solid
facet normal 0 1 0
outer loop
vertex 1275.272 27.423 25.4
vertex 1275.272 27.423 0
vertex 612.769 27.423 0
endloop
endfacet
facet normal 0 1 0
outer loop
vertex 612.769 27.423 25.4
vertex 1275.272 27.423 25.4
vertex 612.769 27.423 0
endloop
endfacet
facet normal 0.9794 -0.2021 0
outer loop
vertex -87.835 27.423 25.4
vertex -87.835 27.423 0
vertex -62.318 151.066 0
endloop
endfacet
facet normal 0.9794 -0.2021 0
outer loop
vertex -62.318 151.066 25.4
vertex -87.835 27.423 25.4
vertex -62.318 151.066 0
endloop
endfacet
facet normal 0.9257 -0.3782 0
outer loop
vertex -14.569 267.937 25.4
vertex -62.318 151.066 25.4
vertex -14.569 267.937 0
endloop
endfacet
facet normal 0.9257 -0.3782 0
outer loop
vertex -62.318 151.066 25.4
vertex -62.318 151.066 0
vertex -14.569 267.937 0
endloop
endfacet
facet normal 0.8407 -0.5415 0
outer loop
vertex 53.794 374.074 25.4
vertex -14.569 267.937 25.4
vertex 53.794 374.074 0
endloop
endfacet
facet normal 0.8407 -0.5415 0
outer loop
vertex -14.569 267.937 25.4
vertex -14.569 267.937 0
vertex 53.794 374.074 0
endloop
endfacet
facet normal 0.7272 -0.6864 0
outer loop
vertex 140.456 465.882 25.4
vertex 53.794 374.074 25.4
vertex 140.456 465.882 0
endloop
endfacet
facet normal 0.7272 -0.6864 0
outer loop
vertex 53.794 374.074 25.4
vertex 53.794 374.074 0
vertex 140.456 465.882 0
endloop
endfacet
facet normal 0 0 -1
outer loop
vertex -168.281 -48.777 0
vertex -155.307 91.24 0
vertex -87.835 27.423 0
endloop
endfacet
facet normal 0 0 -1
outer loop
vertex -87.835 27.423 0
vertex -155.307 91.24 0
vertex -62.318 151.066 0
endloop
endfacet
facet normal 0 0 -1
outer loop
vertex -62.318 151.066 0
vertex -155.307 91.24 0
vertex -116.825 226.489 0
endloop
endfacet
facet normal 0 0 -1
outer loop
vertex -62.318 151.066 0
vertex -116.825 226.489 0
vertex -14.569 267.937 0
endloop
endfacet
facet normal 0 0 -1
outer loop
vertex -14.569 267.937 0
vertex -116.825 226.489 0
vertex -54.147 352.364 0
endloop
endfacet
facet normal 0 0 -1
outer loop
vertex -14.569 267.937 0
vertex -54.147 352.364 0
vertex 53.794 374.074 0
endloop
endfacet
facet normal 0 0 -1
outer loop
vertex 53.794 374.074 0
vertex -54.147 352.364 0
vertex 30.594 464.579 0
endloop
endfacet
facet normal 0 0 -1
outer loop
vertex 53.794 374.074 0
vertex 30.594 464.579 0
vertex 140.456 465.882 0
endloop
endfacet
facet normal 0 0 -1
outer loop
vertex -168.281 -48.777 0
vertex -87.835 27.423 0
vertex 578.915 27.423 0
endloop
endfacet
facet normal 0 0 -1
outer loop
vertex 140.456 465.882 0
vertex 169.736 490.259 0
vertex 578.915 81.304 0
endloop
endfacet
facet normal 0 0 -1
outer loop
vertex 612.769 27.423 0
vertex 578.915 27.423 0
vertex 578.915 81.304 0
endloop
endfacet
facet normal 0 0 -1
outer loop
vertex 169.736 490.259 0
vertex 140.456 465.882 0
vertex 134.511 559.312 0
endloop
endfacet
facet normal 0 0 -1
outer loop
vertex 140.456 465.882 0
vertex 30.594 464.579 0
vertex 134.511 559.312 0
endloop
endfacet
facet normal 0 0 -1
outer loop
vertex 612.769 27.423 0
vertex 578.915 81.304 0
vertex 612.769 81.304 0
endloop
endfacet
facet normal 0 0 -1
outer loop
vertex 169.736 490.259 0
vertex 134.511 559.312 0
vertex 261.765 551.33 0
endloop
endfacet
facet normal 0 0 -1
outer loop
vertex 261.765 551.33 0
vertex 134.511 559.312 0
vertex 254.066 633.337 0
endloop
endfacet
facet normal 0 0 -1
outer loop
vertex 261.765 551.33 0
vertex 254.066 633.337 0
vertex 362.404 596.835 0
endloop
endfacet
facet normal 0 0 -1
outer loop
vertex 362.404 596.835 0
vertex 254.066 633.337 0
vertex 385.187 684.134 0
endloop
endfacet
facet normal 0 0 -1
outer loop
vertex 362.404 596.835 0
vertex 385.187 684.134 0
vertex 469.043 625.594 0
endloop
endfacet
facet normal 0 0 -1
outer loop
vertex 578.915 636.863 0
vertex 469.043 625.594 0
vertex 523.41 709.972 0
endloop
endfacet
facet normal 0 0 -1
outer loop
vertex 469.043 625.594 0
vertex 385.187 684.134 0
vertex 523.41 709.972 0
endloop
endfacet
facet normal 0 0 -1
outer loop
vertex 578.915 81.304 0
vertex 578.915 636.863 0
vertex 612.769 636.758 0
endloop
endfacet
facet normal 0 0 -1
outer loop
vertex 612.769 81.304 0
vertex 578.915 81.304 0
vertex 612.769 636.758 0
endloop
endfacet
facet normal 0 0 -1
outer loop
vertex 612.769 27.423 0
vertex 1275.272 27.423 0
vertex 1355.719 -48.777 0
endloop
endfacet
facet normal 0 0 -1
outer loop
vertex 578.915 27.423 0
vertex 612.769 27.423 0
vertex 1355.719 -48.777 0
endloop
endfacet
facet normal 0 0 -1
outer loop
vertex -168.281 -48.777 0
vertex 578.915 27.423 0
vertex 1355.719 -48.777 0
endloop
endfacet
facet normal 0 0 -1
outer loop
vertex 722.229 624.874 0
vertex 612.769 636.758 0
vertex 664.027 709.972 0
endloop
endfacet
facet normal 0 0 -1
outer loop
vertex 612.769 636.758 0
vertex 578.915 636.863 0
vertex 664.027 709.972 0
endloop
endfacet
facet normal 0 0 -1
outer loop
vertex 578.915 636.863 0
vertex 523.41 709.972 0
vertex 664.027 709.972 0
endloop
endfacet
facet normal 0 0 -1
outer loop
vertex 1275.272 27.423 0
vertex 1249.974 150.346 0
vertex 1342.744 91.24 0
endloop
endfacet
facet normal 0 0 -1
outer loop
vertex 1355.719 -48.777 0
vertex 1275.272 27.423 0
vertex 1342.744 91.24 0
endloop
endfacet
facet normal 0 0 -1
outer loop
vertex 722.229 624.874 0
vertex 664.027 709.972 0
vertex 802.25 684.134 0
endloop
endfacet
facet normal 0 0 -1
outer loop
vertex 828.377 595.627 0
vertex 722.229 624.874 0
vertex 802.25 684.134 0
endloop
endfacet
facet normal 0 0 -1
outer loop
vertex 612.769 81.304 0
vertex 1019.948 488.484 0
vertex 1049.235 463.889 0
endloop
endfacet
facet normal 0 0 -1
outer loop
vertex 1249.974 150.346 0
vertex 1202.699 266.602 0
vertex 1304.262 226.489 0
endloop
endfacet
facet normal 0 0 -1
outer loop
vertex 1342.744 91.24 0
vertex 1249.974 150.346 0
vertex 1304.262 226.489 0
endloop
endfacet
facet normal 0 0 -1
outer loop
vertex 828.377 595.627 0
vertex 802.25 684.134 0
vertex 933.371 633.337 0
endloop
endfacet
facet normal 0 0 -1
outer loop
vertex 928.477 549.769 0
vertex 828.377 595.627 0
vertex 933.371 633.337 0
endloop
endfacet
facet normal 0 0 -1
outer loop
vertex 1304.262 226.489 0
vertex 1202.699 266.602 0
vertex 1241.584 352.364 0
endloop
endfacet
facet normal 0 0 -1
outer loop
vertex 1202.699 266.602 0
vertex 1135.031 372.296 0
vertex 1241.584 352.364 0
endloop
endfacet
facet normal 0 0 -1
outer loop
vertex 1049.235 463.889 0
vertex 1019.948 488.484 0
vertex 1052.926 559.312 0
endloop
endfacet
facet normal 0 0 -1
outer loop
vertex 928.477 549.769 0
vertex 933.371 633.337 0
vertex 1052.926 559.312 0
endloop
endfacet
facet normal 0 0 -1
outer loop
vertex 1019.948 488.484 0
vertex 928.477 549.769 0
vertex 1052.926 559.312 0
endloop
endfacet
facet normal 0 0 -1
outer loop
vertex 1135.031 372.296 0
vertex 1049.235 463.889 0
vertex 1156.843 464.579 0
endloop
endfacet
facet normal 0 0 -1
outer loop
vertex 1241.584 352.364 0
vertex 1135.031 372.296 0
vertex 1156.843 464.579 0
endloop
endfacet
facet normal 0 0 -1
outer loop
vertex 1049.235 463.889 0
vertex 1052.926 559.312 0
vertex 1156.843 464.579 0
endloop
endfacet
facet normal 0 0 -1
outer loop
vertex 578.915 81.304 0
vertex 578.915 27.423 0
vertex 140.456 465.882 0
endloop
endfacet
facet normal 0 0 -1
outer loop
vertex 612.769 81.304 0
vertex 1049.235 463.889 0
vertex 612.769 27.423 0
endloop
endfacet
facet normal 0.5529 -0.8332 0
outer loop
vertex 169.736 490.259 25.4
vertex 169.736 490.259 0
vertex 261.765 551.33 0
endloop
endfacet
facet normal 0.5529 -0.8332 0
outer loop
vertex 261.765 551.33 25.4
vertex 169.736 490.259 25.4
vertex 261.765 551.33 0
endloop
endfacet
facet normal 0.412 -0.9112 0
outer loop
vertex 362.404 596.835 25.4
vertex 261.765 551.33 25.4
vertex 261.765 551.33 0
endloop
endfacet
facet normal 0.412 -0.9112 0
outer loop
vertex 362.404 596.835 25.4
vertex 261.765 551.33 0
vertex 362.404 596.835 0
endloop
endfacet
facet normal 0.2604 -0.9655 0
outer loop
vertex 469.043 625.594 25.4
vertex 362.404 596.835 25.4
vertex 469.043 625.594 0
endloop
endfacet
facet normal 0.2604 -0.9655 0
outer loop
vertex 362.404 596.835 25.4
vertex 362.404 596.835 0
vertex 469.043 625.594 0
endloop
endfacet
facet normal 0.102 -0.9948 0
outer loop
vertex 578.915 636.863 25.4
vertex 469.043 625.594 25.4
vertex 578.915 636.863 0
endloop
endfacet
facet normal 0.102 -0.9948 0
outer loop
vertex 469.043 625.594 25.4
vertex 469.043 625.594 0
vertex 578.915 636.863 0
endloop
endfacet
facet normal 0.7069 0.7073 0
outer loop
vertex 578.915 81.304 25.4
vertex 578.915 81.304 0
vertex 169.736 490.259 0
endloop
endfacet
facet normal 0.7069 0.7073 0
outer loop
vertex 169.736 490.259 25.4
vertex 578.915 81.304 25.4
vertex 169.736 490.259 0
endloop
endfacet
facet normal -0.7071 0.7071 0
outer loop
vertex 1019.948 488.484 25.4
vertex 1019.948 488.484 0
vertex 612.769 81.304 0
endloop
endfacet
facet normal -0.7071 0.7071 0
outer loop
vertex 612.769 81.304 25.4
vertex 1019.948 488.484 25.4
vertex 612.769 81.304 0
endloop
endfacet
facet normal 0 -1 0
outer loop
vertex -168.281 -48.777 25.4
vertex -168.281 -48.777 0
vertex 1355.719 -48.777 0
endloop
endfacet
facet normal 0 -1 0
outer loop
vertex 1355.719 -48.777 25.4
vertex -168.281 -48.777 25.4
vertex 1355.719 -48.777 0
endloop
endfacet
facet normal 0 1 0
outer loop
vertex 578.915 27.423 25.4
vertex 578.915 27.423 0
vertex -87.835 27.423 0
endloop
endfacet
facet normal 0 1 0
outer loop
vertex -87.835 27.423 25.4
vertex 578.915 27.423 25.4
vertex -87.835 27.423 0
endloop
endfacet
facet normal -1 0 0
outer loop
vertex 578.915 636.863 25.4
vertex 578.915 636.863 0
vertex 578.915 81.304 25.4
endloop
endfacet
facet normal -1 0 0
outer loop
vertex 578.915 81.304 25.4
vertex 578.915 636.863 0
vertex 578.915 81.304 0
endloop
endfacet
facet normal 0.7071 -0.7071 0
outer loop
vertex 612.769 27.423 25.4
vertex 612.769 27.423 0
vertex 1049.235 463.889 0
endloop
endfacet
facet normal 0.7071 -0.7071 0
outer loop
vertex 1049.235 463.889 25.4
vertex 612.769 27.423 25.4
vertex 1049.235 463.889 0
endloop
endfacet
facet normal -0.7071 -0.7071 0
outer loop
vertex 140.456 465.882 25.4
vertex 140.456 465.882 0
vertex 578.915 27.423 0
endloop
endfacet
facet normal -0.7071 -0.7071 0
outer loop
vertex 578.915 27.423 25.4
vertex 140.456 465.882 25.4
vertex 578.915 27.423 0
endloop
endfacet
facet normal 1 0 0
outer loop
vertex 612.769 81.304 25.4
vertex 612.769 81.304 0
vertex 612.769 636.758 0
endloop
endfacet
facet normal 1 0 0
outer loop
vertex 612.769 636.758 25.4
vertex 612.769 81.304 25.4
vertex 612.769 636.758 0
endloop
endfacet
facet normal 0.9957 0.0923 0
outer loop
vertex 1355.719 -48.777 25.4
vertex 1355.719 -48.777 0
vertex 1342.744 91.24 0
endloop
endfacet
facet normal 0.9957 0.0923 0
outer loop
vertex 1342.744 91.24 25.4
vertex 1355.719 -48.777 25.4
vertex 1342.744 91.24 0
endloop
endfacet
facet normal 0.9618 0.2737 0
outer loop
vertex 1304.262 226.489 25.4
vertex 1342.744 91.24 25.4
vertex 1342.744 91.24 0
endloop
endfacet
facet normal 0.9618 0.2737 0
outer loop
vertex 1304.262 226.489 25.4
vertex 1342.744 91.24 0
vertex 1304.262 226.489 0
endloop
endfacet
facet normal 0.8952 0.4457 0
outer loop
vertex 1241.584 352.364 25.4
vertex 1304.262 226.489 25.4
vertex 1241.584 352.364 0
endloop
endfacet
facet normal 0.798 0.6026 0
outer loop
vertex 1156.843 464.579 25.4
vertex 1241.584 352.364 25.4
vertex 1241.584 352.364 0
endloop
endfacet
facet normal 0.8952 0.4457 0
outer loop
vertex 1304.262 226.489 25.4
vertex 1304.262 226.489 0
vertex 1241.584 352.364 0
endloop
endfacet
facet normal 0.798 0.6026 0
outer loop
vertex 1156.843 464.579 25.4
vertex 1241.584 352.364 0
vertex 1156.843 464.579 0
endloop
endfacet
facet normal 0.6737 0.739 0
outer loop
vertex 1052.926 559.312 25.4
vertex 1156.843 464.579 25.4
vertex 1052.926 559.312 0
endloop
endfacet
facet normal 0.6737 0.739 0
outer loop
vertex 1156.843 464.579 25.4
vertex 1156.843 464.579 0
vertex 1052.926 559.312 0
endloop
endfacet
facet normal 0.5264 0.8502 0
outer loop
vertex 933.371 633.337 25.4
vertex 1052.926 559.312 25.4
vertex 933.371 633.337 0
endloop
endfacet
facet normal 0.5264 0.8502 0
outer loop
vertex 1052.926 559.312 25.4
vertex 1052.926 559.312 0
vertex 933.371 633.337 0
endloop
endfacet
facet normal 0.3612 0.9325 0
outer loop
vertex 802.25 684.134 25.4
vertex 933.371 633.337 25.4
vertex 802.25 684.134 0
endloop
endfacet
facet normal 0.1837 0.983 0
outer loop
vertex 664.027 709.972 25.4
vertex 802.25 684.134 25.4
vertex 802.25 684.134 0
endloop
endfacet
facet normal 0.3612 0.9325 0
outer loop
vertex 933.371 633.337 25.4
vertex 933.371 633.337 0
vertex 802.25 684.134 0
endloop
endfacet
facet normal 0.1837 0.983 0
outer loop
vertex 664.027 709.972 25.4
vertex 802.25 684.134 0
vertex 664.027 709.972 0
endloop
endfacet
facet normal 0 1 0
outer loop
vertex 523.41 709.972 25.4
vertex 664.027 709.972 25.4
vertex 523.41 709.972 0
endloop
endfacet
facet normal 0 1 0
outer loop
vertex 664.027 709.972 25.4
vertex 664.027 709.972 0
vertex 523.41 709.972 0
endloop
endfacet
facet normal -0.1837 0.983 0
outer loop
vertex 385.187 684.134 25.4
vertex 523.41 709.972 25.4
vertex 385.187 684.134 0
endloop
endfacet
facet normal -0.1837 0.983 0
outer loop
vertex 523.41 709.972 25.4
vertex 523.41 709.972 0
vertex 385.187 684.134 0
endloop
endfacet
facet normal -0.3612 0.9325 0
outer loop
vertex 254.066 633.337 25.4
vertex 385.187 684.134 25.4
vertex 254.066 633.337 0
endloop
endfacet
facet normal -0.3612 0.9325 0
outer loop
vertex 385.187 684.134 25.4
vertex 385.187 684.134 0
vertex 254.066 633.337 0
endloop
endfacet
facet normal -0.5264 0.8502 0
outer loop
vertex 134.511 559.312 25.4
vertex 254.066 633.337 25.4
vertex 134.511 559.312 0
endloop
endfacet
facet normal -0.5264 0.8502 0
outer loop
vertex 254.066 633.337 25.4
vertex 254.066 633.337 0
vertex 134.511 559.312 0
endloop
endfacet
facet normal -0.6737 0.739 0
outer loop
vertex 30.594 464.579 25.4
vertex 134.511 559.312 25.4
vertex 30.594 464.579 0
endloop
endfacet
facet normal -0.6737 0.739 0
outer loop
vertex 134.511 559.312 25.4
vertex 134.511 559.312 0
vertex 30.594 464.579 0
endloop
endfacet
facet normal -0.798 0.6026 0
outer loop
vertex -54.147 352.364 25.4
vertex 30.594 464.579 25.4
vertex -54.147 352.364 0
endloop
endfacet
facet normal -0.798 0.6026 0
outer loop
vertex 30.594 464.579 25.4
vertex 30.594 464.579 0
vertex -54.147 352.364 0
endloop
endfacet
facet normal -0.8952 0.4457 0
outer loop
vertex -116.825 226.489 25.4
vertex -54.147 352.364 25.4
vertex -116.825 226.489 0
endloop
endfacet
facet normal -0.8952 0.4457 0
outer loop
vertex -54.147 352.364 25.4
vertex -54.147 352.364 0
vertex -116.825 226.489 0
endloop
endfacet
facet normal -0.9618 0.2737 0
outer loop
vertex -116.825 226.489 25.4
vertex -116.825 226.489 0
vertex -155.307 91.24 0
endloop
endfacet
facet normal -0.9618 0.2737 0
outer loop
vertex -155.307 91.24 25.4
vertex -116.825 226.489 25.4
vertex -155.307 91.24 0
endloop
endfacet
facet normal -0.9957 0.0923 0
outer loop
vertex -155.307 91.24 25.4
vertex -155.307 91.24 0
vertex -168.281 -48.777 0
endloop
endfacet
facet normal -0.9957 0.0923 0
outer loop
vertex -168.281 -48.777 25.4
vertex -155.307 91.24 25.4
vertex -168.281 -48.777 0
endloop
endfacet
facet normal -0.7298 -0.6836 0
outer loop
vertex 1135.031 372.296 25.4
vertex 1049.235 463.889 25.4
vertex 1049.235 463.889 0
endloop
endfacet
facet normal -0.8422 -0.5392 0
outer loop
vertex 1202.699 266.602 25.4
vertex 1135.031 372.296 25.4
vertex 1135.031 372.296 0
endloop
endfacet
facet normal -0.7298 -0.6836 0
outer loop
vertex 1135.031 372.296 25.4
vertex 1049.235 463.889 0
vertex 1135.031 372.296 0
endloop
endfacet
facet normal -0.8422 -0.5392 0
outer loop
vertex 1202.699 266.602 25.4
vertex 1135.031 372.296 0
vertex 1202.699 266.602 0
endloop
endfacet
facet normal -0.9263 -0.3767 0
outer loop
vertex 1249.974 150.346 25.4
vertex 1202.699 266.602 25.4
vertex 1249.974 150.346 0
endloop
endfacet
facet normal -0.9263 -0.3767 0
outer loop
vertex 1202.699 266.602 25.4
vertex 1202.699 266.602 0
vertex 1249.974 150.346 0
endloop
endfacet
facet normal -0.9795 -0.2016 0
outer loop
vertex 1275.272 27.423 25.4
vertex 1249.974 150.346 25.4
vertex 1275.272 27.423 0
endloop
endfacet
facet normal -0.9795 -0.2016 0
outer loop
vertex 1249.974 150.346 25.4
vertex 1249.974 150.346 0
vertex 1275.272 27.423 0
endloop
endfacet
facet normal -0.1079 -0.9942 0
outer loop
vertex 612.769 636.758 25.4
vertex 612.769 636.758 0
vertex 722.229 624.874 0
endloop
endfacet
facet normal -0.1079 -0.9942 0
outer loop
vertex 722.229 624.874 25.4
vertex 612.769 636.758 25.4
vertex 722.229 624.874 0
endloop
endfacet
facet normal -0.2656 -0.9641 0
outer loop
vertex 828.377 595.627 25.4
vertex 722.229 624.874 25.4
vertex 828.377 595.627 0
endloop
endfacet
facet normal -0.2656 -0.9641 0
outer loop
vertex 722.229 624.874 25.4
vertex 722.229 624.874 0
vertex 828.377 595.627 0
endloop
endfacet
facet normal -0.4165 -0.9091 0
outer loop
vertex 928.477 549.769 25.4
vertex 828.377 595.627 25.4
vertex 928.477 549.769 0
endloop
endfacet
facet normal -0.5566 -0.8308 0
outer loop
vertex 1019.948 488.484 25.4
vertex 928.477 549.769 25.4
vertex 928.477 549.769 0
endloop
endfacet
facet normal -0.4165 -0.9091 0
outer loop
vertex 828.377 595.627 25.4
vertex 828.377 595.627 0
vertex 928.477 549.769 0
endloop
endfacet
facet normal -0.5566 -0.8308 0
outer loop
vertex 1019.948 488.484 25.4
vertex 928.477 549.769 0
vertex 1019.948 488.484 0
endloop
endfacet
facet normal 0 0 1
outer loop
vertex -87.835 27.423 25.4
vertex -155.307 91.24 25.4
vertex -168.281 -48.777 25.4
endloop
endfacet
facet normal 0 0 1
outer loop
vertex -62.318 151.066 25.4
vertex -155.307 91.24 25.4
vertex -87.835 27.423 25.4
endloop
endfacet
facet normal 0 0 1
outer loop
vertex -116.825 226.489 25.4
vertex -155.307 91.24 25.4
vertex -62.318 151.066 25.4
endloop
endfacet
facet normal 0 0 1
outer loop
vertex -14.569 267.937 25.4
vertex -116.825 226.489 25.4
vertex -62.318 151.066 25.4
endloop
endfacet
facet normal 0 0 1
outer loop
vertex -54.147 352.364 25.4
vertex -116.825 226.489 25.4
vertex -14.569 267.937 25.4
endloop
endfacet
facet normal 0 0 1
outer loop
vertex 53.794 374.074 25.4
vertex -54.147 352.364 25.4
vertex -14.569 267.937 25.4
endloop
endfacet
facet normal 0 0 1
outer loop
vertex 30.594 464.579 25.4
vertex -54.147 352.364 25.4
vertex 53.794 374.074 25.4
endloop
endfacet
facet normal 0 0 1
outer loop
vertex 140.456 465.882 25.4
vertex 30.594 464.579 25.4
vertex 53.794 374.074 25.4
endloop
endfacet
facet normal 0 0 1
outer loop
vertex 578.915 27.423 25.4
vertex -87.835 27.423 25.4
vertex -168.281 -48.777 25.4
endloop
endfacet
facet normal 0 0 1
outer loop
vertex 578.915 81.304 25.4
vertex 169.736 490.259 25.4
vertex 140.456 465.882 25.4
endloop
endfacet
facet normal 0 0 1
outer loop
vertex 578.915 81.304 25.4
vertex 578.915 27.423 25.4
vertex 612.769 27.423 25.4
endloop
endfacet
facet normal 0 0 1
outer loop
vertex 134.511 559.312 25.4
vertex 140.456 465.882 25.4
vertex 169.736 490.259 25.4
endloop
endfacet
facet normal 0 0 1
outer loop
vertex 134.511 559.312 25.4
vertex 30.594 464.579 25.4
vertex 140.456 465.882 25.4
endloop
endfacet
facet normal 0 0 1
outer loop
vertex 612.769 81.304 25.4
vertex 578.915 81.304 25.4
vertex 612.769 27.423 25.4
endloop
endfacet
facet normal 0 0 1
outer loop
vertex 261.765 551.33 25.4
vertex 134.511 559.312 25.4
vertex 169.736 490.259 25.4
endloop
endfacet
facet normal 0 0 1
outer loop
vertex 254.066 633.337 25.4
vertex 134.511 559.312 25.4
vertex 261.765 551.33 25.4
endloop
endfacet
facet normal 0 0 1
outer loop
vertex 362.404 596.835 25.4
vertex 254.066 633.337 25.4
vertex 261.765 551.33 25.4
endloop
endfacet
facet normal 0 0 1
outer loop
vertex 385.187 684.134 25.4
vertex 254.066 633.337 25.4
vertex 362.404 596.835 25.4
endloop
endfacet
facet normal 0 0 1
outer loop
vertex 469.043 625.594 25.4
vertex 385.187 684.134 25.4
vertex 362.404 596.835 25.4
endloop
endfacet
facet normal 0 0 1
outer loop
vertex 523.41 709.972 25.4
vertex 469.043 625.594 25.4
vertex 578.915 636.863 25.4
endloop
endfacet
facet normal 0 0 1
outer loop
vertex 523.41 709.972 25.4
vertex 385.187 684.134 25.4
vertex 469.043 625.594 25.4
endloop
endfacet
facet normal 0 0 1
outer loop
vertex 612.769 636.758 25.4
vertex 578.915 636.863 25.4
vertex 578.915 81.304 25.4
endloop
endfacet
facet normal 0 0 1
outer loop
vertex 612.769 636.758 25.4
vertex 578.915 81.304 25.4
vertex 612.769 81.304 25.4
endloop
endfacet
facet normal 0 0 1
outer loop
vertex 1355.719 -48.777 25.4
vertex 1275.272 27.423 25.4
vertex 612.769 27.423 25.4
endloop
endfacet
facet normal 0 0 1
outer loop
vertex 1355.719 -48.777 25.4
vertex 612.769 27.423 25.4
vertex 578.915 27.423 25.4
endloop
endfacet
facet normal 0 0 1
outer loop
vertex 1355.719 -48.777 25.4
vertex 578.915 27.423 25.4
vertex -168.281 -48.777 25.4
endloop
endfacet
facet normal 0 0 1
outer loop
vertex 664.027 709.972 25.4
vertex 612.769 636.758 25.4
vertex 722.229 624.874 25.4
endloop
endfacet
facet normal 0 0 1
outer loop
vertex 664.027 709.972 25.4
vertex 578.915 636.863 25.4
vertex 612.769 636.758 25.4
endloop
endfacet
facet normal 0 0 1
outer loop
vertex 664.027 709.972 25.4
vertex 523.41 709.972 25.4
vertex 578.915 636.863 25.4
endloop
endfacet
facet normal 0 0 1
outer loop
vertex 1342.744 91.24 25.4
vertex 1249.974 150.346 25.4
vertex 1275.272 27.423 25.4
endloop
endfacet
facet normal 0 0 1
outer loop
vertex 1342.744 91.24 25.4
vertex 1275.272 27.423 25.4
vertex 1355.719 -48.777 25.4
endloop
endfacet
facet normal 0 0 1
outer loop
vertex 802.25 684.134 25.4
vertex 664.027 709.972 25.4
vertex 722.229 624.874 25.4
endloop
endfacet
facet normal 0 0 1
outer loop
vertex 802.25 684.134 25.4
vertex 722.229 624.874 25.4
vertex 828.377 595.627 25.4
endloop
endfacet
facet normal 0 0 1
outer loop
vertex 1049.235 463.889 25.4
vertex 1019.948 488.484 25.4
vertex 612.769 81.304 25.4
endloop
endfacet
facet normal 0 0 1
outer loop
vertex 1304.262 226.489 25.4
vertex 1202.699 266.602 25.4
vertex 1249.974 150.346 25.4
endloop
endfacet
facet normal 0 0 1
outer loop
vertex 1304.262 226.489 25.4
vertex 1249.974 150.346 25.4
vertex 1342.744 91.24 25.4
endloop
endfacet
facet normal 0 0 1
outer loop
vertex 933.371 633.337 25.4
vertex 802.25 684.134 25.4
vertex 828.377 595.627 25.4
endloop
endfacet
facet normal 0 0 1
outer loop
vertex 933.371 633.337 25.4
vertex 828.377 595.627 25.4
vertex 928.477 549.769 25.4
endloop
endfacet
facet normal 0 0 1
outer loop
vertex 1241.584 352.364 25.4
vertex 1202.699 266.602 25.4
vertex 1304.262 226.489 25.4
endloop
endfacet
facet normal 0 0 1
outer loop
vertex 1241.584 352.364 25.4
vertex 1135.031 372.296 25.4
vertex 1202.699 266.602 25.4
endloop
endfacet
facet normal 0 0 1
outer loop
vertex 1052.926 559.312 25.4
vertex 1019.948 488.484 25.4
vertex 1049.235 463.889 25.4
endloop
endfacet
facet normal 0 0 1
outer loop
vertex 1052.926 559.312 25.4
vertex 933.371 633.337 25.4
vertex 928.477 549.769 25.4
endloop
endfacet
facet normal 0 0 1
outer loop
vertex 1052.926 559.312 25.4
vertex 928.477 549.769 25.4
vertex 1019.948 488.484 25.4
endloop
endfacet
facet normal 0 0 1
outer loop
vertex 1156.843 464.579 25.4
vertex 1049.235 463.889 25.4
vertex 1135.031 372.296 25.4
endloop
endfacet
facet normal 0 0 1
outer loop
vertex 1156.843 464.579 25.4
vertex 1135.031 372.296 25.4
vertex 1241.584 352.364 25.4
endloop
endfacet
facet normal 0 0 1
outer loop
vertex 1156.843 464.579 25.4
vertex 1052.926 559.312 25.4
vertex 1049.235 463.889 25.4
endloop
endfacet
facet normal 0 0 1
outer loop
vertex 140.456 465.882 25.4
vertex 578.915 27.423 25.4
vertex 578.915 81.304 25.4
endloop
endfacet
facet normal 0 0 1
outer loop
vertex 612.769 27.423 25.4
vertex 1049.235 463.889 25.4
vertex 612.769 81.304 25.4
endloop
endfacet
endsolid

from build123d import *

# Parameters (mm, degrees)
F1_DEPTH = 25.4


with BuildPart() as f1:
    # F0 (on Top) → F1 (new body)
    with BuildSketch(Plane.XY):
        with BuildLine():
            ThreePointArc((593.7185342312, 713.2225054204), (54.903166967, 490.0378726846), (-168.2814657688, -48.7774945796))
            Line((-168.2814657688, -48.7774945796), (593.7185342312, -48.7774945796))
            Line((593.7185342312, -48.7774945796), (1355.7185342312, -48.7774945796))
            ThreePointArc((1355.7185342312, -48.7774945796), (1132.5339014953, 490.0378726846), (593.7185342312, 713.2225054204))
        make_face()
        with BuildLine():
            Line((578.9150146893, 27.4225054204), (558.8869975048, 27.4225054204))
            Line((558.8869975048, 27.4225054204), (-87.8349853107, 27.4225054204))
            ThreePointArc((-87.8349853108, 27.4225054204), (-14.5690429068, 267.9366722959), (140.4555796865, 465.8819404232))
            Line((140.4555796865, 465.8819404232), (578.9150146893, 27.4225054204))
        make_face(mode=Mode.SUBTRACT)
        with BuildLine():
            ThreePointArc((1049.2347336709, 463.8887048602), (1202.6992993376, 266.6017497128), (1275.2720537731, 27.4225054204))
            Line((1275.2720537731, 27.4225054204), (612.7685342312, 27.4225054204))
            Line((612.7685342312, 27.4225054204), (1049.2347336709, 463.8887048602))
        make_face(mode=Mode.SUBTRACT)
        with BuildLine():
            Line((578.9150146893, 636.8627141372), (578.9150146893, 81.3040334204))
            Line((578.9150146893, 81.3040334204), (386.5735172011, 273.5404429351))
            Line((386.5735172011, 273.5404429351), (169.7362173216, 490.2592712796))
            ThreePointArc((169.7362173216, 490.2592712796), (362.4040406687, 596.8348078651), (578.9150146893, 636.8627141372))
        make_face(mode=Mode.SUBTRACT)
        with BuildLine():
            Line((1019.9483620731, 488.4838699888), (917.7654260406, 386.3009339562))
            Line((917.7654260406, 386.3009339562), (612.7685342312, 81.3040421469))
            Line((612.7685342312, 81.3040421469), (612.7685342312, 636.757871029))
            ThreePointArc((612.7685342312, 636.757871029), (828.3774912664, 595.6267371595), (1019.9483620731, 488.4838699888))
        make_face(mode=Mode.SUBTRACT)
    extrude(amount=F1_DEPTH)


solid = f1.part
